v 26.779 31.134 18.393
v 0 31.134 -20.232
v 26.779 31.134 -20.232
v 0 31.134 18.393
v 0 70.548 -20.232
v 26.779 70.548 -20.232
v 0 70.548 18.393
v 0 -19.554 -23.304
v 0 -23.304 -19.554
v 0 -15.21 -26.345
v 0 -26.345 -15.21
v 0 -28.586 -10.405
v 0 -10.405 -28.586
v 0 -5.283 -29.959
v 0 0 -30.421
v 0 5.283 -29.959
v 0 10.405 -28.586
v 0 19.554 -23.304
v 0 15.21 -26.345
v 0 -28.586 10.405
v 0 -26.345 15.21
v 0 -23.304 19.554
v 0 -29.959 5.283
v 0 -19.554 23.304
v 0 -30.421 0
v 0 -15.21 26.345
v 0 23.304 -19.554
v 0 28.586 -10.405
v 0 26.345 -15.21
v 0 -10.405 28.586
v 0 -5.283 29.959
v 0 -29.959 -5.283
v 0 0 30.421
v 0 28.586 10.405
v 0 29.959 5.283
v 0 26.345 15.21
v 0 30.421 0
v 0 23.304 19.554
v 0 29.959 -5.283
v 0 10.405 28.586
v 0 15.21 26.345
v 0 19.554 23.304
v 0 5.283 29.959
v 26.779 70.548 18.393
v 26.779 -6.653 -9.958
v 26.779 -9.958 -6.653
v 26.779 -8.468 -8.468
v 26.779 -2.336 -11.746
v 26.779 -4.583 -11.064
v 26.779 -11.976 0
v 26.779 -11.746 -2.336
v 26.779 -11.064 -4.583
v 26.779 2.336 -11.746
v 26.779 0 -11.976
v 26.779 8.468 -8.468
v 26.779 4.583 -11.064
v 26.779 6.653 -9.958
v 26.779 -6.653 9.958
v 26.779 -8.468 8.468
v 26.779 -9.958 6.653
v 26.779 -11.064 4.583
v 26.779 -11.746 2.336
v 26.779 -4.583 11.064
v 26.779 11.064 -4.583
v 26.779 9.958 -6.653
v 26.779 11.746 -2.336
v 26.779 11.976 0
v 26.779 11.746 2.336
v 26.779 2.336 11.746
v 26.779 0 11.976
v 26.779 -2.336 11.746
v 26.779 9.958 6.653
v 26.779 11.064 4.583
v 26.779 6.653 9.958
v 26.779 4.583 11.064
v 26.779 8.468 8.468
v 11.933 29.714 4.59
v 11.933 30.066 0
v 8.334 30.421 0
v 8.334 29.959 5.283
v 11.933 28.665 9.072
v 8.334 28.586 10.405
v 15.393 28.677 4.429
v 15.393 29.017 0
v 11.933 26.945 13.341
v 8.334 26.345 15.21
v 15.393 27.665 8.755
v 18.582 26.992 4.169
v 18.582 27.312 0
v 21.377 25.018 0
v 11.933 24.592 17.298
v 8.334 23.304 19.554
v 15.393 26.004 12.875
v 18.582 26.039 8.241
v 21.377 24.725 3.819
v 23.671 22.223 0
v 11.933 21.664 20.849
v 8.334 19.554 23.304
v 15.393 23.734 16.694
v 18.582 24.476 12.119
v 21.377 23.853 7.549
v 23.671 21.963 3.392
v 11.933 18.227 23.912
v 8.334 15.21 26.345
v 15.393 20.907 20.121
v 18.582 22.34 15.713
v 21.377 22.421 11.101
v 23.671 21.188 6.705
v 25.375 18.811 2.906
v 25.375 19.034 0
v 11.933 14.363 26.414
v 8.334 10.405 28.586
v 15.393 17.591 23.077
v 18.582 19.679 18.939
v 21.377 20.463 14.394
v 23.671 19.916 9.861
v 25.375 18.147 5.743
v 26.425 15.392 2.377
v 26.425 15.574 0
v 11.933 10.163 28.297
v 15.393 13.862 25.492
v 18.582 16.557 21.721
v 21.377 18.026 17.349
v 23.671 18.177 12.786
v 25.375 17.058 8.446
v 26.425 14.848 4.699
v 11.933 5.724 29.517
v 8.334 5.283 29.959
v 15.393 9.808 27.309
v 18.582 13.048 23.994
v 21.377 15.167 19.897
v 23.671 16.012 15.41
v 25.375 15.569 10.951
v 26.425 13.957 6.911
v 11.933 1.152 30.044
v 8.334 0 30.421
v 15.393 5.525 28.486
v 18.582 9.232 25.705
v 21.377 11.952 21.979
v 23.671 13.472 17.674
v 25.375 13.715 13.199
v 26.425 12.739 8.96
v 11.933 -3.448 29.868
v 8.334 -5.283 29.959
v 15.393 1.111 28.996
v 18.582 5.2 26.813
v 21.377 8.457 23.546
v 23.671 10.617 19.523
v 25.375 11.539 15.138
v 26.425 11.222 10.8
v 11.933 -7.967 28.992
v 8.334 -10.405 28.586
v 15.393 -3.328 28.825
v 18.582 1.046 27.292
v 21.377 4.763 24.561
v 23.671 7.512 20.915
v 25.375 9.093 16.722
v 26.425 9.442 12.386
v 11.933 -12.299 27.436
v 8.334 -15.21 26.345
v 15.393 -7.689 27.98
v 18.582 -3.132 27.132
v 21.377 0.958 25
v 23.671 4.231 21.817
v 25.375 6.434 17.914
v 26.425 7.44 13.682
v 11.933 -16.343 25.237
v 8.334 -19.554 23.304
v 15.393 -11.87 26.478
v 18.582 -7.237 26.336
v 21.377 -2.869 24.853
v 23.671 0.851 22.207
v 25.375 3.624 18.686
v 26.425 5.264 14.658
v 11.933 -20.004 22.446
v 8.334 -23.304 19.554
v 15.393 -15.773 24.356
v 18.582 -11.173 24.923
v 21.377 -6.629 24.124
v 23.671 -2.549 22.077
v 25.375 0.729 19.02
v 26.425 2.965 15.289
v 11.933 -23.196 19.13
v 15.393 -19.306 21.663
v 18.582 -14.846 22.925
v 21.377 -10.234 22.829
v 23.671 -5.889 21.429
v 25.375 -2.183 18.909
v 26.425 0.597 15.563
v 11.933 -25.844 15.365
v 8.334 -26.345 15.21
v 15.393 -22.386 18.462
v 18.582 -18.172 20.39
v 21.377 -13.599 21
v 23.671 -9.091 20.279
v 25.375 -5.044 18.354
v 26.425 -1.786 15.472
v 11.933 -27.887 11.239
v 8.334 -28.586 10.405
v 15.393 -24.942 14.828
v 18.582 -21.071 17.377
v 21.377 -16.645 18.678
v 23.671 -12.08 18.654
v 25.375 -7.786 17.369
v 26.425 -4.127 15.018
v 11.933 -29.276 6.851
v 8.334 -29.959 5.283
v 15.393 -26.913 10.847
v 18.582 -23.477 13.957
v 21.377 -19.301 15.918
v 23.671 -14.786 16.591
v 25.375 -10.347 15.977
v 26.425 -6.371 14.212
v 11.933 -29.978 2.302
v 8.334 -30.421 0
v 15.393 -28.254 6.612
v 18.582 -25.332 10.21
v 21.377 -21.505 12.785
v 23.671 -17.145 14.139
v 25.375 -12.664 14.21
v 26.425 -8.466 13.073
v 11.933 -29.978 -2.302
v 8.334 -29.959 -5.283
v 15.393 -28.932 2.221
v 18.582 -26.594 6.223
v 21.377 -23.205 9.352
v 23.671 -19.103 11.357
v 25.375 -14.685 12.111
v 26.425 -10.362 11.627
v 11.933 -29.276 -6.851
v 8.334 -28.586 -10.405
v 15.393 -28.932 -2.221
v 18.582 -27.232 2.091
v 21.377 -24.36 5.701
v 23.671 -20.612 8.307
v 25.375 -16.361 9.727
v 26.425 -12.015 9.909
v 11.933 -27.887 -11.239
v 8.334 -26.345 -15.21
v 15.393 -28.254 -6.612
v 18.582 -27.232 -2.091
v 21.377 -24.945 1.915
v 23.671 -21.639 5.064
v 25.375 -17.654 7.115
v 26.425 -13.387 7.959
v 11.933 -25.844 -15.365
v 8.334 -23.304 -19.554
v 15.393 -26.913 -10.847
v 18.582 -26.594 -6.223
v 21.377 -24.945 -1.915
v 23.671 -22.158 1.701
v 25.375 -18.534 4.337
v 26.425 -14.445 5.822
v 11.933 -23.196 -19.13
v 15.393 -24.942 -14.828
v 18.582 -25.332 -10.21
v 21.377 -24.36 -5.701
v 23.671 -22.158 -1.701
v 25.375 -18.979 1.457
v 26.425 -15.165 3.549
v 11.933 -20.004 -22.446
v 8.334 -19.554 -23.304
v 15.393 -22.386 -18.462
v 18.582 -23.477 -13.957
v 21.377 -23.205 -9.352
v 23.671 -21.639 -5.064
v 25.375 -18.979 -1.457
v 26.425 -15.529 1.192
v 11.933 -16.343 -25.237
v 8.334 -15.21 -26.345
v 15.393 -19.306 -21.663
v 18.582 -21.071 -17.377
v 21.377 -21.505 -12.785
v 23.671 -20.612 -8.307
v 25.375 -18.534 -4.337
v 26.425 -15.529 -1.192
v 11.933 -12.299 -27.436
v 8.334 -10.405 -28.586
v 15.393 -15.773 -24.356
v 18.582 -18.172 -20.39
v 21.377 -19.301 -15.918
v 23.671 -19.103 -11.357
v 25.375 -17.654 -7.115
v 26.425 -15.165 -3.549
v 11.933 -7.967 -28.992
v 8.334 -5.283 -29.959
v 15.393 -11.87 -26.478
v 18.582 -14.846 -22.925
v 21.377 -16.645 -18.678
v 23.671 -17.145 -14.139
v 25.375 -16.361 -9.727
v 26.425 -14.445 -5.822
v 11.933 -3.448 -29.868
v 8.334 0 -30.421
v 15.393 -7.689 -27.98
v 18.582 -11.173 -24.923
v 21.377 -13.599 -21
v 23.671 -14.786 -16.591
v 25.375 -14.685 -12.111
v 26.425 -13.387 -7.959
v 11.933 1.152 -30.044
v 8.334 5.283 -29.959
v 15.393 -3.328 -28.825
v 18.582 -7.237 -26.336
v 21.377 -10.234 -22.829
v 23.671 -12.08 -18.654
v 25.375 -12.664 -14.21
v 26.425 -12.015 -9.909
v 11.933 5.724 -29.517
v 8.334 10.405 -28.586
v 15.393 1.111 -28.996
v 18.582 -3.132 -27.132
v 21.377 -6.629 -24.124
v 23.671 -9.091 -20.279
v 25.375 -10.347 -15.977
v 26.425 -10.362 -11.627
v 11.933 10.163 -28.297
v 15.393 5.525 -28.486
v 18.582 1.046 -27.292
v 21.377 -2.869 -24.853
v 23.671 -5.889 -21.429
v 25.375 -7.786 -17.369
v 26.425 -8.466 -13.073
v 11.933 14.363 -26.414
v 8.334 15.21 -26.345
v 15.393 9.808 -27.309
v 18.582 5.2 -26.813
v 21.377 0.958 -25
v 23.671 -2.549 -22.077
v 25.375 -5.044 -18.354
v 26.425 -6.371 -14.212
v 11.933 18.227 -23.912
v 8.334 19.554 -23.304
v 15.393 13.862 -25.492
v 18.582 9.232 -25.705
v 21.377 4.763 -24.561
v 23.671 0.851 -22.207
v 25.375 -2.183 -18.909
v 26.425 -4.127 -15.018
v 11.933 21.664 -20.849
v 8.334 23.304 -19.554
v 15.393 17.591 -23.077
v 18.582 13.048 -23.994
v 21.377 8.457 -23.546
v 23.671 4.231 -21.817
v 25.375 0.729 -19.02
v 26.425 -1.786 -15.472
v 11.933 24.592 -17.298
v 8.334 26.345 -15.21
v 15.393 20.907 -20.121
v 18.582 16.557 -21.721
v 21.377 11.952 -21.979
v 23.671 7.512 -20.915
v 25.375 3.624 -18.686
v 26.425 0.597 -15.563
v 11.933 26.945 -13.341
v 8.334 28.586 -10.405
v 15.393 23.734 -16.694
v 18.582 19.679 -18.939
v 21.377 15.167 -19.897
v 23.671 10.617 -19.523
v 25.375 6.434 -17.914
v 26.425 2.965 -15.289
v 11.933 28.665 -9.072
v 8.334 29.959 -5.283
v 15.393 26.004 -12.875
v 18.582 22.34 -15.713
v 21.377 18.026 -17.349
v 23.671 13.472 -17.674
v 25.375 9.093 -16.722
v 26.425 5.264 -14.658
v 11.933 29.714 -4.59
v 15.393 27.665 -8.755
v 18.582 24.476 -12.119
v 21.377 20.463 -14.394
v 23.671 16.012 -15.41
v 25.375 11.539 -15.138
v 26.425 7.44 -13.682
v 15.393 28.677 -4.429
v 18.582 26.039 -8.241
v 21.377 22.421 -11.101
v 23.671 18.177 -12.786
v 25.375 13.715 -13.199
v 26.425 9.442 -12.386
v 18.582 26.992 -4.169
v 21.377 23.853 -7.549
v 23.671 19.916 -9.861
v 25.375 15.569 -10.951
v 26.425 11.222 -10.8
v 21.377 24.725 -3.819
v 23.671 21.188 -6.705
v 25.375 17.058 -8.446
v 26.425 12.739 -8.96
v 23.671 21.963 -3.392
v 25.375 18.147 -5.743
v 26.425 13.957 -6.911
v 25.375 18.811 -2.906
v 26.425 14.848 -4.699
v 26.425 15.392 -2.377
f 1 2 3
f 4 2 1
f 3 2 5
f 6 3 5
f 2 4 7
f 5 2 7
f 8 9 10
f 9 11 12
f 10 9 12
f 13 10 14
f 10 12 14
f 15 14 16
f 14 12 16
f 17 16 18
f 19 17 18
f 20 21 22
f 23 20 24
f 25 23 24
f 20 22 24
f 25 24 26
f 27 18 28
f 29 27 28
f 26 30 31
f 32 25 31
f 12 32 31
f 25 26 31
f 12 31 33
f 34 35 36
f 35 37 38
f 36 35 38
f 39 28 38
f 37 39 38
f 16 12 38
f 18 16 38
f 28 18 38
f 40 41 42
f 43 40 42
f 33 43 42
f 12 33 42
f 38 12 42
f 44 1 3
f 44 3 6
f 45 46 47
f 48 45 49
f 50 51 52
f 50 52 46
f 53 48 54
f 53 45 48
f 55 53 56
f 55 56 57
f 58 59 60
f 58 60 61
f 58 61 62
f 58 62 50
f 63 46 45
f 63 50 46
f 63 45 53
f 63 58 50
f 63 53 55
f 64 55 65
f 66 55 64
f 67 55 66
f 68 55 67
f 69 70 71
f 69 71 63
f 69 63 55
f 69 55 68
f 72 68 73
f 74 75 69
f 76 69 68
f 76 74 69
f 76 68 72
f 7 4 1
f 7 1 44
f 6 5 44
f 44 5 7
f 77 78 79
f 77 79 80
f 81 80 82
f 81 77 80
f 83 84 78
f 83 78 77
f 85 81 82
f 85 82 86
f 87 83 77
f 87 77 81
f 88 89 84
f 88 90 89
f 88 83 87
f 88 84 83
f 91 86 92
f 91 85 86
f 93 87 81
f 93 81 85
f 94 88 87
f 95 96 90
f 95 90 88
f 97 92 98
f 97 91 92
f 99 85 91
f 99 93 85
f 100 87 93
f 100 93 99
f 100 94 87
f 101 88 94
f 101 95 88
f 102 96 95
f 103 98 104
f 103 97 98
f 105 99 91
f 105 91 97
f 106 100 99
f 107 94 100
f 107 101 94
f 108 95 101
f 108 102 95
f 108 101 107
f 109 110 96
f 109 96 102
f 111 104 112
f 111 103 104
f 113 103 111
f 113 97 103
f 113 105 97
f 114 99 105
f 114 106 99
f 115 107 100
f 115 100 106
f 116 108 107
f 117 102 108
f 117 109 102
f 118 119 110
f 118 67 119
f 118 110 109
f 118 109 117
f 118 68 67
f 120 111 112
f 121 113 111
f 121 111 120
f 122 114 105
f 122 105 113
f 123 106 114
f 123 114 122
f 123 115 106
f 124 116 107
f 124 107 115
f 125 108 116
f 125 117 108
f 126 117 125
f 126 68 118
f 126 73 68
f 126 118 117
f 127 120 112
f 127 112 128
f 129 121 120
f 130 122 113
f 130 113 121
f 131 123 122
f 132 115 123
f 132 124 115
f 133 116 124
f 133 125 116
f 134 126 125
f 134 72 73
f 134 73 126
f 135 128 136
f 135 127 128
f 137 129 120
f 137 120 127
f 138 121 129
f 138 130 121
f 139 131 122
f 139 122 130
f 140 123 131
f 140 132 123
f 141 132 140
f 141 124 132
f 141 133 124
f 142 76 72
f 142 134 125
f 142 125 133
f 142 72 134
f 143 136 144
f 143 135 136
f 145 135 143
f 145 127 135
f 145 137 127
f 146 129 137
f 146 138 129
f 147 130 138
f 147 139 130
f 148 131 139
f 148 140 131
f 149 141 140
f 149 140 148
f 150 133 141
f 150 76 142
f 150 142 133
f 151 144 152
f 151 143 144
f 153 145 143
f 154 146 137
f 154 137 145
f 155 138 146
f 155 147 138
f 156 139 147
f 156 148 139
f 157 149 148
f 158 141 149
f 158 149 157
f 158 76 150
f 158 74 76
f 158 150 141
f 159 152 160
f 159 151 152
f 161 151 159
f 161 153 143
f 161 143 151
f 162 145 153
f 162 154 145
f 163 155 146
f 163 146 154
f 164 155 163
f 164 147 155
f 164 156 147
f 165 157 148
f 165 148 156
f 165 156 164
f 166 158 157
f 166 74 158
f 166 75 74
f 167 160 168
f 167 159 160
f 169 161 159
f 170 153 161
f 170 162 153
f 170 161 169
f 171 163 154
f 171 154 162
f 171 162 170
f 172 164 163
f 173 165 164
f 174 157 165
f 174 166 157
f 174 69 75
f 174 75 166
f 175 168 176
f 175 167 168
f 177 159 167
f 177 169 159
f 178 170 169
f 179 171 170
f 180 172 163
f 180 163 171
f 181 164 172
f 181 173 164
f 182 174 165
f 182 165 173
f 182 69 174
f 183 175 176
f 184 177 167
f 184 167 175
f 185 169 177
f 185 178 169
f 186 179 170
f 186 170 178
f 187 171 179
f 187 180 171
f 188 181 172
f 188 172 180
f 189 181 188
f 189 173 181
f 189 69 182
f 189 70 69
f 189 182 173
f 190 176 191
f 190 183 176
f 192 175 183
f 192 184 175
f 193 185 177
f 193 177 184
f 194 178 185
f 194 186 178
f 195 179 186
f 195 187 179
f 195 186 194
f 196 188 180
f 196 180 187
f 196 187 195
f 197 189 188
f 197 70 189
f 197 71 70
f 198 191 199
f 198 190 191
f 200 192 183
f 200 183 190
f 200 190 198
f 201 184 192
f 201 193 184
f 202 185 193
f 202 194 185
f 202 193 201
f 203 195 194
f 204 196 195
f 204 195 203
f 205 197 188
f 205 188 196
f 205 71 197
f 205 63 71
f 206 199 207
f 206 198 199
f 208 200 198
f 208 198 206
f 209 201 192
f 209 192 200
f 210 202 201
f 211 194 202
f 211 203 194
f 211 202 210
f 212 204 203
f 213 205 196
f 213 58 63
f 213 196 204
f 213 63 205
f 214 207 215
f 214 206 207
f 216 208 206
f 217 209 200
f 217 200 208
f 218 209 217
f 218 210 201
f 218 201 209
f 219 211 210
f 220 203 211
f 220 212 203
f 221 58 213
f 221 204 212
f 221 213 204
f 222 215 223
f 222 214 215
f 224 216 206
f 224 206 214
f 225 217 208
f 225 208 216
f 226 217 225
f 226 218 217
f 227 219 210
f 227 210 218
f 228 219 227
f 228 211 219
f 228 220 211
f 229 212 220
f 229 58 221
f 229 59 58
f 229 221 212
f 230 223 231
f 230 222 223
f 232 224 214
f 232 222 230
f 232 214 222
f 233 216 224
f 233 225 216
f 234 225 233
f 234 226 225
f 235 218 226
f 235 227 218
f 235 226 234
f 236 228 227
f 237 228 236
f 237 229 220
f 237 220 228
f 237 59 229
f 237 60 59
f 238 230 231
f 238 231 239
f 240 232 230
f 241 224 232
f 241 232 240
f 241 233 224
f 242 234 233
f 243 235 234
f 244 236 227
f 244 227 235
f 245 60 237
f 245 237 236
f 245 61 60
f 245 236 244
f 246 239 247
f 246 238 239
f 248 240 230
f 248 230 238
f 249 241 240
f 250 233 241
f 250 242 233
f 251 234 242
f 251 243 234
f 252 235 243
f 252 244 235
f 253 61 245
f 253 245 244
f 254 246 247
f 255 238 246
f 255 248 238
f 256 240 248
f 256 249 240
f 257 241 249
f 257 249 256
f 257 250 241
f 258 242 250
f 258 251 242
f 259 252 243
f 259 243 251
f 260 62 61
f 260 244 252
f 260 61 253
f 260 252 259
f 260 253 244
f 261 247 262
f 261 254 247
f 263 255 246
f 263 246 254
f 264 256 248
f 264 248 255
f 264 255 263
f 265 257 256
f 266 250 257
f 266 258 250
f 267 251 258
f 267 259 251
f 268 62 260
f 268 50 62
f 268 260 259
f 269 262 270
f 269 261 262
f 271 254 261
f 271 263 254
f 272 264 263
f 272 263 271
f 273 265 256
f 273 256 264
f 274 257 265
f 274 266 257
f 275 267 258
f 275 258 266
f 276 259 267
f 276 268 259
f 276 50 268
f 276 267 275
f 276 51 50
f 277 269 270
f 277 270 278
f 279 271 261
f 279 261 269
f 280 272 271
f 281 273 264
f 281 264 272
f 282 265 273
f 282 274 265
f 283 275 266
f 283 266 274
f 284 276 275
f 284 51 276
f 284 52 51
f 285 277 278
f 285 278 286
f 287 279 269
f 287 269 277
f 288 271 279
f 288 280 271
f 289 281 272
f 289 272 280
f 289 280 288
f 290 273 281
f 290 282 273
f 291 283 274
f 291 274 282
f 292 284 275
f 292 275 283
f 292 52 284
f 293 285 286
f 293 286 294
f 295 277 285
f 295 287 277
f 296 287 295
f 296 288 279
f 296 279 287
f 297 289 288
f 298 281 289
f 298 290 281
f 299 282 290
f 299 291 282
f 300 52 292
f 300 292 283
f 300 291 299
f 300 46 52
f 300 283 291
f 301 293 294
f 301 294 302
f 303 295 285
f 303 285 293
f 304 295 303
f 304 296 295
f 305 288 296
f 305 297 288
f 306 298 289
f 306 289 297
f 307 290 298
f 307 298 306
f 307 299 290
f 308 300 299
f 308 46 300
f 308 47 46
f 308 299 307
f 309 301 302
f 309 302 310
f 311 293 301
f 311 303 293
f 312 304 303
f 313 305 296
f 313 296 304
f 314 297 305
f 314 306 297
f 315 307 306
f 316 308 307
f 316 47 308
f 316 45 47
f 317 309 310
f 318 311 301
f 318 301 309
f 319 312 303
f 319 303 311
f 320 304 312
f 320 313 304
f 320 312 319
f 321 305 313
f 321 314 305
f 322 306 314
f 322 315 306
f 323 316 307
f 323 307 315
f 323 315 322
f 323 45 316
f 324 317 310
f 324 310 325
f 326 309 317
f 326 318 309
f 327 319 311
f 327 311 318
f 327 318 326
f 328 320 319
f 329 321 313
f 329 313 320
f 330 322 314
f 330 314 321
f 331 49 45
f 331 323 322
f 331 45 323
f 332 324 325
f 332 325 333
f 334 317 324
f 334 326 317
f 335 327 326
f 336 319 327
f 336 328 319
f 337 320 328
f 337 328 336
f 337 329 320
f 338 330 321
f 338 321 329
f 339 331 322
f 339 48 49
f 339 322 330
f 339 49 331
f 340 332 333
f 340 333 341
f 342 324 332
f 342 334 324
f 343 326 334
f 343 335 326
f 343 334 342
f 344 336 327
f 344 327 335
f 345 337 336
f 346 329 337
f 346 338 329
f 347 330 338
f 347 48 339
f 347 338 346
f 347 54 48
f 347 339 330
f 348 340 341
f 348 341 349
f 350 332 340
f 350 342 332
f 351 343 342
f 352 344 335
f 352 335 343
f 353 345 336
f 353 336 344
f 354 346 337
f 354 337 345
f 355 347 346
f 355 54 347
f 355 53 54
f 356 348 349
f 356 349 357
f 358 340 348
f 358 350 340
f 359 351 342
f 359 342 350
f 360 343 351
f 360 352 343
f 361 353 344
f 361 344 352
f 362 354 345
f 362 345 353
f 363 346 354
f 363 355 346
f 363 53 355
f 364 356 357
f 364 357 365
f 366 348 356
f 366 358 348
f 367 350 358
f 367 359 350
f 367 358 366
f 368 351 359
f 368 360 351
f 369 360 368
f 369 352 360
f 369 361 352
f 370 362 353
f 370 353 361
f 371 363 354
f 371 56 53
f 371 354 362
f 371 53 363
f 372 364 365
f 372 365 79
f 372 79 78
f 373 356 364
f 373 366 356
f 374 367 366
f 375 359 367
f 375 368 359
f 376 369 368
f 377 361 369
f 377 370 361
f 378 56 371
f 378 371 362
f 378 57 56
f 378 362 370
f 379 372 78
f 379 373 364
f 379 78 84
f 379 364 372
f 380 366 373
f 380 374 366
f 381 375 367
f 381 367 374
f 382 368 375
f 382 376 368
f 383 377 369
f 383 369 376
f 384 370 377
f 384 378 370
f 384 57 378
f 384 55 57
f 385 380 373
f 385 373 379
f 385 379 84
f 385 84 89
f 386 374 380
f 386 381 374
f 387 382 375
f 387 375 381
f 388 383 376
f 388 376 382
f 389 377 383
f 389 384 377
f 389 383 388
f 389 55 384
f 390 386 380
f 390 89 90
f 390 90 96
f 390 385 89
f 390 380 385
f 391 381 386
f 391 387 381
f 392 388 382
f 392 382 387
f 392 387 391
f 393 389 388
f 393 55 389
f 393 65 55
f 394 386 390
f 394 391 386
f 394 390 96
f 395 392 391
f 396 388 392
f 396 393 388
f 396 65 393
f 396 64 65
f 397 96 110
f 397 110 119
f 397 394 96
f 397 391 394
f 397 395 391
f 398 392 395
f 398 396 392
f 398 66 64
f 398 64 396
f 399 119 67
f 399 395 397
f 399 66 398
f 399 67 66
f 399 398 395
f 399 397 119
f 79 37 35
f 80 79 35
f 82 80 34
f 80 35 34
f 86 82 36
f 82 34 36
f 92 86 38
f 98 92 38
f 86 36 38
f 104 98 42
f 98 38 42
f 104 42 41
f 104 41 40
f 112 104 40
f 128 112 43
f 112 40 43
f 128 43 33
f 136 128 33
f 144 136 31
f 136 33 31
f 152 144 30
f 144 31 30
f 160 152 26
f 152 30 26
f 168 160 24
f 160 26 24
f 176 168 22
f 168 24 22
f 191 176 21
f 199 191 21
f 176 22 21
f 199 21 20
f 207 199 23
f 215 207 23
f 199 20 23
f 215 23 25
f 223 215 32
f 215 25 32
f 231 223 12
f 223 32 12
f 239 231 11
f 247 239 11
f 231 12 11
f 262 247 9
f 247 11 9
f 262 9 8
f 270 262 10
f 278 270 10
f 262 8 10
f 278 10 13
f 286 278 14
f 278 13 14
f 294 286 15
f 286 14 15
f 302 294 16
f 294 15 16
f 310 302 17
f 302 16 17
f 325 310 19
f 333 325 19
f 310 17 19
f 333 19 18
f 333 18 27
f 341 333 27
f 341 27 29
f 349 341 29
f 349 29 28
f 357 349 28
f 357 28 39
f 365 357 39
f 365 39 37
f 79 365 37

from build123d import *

# Parameters (mm, degrees)
F0_R     = 30.4208936765
F1_DEPTH = 26.77935
F0_W     = 39.4137930125
F0_H     = 38.6255178601
F2_R     = 18.4450744592


# Not quite as in the source:
# - the program builds the solid bodies; features that only make, move or delete a surface that nothing else refers to are left out


with BuildPart() as f1:
    # F0 (on Right) → F1 (new body)
    with BuildSketch(Plane.YZ):
        Circle(F0_R)
    extrude(amount=F1_DEPTH)

    # F2
    f2_edges = [f1.edges().sort_by_distance(p)[0] for p in [
        (26.77935, -30.420894, 0),
    ]]
    fillet(f2_edges, radius=F2_R)


with BuildPart() as f1b:
    # F0 (on Right) → F1, piece 2 (new body)
    with BuildSketch(Plane.YZ):
        with Locations((50.8410567418, -0.9196558967)):
            Rectangle(F0_W, F0_H)
    extrude(amount=F1_DEPTH)


solid = Compound([f1.part, f1b.part])
